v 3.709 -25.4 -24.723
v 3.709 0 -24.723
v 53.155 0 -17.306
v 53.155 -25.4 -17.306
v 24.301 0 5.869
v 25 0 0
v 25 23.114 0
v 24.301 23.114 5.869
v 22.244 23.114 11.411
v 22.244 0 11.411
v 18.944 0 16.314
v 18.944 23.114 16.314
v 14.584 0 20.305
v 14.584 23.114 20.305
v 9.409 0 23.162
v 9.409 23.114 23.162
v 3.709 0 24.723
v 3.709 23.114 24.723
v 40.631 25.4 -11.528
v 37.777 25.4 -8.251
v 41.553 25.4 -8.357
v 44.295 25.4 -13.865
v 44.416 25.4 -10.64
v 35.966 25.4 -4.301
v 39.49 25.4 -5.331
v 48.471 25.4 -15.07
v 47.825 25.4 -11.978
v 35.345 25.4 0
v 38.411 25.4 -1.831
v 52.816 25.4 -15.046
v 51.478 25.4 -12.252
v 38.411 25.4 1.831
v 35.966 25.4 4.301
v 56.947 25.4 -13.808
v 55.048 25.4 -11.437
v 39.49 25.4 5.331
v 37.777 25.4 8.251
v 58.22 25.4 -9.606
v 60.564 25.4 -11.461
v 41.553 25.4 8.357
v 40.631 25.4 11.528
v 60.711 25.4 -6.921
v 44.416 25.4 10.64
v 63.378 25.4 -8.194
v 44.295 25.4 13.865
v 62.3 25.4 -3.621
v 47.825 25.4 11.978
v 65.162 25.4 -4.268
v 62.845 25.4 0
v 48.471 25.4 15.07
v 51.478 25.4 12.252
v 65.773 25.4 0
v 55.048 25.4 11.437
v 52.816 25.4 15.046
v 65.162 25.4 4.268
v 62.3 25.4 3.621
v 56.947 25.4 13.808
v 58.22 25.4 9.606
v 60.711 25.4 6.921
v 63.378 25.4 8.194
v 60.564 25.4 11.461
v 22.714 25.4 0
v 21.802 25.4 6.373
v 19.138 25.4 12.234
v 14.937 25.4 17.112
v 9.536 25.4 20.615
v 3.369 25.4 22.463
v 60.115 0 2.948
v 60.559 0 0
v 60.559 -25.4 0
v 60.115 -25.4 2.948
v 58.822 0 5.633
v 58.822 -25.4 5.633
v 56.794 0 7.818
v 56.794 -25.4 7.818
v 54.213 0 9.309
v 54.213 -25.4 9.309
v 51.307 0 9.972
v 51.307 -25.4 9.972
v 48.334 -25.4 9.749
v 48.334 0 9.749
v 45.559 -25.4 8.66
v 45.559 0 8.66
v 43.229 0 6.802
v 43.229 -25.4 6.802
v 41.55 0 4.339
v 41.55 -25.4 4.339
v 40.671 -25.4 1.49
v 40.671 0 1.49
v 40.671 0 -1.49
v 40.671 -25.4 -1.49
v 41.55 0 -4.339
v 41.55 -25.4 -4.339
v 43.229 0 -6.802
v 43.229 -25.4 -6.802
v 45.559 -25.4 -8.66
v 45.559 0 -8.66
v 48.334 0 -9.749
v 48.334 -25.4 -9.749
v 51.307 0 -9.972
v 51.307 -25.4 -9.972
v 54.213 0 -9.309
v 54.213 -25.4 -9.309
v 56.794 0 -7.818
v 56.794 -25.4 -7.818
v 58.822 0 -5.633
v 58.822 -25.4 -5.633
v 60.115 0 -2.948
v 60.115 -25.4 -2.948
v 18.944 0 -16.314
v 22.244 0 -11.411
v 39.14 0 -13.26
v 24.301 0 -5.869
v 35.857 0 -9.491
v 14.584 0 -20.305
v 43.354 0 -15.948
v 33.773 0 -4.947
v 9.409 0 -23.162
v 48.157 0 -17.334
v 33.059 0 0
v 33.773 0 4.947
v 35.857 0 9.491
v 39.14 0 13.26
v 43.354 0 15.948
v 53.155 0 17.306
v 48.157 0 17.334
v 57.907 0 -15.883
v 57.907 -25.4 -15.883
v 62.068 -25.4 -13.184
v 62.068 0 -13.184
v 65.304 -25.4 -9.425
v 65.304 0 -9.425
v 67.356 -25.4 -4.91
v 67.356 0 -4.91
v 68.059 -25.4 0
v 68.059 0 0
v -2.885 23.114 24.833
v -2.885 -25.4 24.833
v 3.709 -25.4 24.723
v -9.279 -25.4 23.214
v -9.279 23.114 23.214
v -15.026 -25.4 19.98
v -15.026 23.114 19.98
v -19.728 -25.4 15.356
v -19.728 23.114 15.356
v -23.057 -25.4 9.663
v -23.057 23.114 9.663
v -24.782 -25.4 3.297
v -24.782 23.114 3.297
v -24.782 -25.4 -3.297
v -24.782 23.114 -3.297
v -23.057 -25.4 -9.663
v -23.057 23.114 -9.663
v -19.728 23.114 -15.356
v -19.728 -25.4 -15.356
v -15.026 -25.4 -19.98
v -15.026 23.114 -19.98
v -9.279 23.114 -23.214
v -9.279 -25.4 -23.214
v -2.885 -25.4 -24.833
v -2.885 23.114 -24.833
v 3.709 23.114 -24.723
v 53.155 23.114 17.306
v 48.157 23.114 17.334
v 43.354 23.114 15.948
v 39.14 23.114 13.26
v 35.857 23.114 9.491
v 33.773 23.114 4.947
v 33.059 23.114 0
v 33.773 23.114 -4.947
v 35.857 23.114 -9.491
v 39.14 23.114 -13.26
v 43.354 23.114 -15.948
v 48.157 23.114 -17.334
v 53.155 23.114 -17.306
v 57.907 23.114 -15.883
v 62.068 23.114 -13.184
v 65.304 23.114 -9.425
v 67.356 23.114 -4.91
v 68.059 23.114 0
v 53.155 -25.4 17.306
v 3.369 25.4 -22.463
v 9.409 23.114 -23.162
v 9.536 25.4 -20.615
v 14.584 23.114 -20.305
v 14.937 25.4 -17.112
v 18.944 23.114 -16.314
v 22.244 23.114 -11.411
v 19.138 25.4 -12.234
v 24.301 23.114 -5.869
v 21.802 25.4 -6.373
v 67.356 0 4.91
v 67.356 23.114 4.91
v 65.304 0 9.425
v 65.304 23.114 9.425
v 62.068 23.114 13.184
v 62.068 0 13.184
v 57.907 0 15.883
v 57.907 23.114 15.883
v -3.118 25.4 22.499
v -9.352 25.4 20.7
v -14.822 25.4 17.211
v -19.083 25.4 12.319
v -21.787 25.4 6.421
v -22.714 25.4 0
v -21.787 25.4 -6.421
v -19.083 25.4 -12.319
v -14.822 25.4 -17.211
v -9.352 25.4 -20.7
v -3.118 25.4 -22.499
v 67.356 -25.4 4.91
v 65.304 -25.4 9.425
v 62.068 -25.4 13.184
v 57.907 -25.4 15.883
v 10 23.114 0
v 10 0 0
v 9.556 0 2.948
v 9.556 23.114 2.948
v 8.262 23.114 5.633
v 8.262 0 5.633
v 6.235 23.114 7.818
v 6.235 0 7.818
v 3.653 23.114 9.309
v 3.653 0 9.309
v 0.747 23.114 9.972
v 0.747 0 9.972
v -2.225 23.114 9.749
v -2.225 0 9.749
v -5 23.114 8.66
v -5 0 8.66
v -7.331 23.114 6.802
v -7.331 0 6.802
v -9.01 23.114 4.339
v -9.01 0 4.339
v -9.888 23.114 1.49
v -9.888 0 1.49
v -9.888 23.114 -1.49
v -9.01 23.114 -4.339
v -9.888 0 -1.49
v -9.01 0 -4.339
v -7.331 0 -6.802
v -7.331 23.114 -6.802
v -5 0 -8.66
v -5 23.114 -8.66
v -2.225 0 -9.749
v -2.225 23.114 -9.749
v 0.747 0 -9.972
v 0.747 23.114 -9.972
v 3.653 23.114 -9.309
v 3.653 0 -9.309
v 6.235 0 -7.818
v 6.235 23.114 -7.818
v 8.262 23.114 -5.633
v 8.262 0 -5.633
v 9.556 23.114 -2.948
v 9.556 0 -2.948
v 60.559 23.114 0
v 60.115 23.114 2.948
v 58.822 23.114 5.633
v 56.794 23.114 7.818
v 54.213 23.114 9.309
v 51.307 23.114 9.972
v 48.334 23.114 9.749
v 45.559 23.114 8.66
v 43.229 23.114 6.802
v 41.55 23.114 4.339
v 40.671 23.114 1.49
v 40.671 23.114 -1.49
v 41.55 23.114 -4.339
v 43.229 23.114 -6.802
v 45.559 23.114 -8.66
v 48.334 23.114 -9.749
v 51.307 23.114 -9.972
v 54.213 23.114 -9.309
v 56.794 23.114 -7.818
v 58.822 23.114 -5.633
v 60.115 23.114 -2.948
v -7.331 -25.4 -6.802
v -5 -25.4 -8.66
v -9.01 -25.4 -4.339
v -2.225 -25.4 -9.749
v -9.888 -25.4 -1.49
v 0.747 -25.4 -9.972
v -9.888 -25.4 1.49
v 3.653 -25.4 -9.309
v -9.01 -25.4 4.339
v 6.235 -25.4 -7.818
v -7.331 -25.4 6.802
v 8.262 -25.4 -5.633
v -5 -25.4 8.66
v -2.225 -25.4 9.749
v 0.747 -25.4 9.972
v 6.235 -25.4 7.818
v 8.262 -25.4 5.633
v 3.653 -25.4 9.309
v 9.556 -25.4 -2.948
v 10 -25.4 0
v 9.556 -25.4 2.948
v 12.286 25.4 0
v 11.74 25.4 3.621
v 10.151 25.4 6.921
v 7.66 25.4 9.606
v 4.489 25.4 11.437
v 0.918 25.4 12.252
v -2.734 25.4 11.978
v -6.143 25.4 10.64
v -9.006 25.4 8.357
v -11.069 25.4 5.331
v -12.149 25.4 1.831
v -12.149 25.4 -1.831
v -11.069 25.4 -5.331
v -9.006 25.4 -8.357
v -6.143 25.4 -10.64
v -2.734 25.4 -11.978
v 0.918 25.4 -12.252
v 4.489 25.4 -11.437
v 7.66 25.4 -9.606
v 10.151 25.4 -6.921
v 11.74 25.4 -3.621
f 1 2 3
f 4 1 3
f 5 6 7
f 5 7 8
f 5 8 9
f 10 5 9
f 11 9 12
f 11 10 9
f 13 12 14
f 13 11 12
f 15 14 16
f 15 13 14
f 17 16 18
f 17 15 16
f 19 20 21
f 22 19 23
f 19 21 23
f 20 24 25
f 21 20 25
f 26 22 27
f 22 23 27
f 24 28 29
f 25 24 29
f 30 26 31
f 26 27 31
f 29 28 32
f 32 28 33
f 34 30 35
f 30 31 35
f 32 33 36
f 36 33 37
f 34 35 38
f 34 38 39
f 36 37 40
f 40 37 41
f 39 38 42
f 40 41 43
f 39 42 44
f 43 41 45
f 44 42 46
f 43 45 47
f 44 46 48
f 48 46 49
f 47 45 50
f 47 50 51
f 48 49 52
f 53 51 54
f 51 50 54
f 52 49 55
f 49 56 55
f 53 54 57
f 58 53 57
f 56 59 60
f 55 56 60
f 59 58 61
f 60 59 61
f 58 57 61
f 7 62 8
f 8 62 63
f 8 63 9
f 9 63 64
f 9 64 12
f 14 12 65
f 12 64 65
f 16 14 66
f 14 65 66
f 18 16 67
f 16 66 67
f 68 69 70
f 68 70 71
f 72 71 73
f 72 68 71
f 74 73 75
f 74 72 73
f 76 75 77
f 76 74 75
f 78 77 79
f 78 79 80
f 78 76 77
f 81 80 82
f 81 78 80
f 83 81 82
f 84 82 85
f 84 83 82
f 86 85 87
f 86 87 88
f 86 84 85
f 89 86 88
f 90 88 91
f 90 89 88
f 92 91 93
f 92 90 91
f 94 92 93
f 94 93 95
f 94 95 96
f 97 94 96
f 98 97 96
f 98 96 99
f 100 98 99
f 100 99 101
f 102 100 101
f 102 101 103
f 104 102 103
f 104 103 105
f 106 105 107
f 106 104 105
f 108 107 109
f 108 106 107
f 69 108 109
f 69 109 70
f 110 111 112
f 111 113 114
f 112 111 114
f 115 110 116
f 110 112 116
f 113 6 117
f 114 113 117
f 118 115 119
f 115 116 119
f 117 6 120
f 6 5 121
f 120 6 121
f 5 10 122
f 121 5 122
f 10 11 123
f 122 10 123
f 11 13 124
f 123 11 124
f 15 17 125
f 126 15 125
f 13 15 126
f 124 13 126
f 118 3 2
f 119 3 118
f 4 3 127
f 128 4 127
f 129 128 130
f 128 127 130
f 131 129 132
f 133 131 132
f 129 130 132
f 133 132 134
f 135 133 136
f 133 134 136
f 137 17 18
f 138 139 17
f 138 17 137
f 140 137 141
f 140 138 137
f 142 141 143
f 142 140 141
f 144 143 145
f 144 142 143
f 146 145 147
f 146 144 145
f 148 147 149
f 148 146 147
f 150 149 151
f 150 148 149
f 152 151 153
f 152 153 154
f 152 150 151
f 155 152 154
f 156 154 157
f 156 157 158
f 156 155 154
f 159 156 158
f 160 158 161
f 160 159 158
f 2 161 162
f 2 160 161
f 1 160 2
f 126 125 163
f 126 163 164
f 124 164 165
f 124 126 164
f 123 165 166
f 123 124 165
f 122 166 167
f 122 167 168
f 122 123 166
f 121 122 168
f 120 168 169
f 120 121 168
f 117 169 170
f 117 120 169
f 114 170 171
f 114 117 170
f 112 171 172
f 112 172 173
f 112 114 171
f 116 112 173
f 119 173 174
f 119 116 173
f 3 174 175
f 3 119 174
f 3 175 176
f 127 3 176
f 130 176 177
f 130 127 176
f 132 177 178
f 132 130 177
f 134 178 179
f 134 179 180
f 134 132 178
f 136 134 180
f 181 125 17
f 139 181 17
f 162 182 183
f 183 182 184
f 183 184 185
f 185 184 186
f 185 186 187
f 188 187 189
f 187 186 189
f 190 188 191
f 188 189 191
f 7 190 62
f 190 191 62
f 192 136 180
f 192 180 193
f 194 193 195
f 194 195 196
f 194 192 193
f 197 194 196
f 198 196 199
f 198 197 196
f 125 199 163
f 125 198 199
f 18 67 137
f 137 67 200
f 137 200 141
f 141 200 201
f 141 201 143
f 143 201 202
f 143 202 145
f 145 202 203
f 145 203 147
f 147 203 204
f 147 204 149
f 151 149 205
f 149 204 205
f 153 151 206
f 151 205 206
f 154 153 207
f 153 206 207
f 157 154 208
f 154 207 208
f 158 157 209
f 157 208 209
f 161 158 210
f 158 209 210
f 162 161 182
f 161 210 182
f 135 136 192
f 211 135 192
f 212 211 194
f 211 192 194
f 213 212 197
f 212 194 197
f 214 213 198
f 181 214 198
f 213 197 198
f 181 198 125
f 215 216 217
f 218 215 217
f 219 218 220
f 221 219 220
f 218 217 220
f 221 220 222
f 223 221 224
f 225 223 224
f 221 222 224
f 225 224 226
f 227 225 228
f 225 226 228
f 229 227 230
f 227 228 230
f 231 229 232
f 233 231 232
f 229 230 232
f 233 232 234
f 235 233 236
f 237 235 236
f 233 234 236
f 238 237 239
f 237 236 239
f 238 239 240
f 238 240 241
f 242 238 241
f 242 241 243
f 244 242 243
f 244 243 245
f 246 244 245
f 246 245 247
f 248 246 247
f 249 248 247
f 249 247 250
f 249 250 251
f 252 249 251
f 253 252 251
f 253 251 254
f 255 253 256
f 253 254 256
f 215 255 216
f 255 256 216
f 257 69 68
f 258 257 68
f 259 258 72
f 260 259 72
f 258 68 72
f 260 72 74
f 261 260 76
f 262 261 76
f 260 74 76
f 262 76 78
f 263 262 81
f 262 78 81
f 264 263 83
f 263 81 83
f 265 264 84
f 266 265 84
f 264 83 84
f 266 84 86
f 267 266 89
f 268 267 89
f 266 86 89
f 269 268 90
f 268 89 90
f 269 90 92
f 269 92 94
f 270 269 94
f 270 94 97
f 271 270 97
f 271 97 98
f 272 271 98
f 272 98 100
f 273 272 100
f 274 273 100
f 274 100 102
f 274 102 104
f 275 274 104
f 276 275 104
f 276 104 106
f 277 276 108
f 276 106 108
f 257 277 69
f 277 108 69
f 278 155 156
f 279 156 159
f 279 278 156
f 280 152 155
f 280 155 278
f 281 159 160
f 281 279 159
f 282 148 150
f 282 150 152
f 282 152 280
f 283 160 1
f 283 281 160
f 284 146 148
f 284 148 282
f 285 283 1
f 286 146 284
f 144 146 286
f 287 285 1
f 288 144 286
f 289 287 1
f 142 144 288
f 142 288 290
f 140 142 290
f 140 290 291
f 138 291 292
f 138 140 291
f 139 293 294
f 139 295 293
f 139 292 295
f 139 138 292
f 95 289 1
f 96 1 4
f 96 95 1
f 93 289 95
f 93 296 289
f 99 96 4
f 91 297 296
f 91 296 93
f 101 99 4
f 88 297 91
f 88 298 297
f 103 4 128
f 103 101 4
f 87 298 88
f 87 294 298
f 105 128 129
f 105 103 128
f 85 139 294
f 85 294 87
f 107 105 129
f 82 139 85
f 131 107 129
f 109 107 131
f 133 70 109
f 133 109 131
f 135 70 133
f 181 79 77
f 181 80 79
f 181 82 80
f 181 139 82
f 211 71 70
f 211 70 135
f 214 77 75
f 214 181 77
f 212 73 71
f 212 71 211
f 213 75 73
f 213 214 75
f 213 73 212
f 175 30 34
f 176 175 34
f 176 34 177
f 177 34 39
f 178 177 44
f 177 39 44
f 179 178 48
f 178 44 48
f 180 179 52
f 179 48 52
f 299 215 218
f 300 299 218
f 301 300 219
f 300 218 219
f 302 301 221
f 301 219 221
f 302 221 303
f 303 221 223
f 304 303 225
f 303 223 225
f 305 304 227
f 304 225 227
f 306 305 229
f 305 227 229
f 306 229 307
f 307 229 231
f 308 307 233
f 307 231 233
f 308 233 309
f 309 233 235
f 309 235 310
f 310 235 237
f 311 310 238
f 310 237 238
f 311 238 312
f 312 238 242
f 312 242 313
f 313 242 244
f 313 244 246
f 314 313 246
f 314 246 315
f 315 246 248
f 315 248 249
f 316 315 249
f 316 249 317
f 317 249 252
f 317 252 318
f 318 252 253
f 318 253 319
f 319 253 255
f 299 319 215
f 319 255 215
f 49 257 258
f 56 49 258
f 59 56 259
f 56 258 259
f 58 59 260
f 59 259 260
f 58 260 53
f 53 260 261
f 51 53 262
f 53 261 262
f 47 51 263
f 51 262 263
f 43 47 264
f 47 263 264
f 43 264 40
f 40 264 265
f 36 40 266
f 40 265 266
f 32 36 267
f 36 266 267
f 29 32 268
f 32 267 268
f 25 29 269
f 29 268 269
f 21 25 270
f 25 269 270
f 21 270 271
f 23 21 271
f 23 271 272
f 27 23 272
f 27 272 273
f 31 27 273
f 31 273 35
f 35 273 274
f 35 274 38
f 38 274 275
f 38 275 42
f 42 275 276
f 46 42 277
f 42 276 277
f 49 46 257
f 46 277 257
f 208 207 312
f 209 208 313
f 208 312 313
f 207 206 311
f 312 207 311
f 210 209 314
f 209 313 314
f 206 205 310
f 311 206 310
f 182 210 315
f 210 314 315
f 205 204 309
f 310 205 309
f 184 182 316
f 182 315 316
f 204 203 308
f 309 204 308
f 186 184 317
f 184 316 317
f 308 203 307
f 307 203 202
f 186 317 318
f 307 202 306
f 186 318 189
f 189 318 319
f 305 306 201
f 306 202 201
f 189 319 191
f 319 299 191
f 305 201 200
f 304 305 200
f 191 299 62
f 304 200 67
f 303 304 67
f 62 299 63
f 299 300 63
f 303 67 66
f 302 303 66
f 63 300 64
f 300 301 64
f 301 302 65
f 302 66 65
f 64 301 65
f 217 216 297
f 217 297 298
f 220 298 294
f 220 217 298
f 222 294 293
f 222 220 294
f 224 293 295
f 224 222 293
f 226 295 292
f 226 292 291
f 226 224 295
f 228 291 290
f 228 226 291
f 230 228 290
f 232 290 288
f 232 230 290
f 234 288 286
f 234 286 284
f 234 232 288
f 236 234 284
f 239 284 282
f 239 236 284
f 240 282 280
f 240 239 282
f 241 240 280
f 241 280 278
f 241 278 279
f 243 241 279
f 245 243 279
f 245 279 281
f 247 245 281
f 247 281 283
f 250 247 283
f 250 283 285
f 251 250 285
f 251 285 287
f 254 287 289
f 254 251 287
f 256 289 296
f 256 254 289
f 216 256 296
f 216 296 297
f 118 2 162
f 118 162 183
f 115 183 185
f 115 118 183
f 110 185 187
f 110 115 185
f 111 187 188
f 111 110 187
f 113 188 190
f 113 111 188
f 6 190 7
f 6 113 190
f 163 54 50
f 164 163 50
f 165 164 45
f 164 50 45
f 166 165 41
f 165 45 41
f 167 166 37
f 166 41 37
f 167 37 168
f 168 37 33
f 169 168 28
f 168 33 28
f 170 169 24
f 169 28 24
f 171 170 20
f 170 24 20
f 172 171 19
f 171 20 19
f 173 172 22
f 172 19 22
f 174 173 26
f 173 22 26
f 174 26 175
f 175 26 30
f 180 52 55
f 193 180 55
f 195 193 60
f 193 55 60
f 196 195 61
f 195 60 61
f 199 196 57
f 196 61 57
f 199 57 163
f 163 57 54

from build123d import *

# Parameters (mm, degrees)
F0_R     = 10
F1_DEPTH = 25.4
F3_DEPTH = 25.4
F4_DEPTH = 25.4
F5_SIZE  = 2.286


# Not quite as in the source:
# - the program builds the solid bodies; features that only make, move or delete a surface that nothing else refers to are left out


with BuildPart() as f1:
    # F0 (on Front) → F1 (new body)
    with BuildSketch(Plane.XZ):
        with BuildLine():
            ThreePointArc((3.7085113233, -24.7234088217), (18.9435052601, -16.313908436), (25, 0))
            ThreePointArc((25, 0), (18.9435052601, 16.313908436), (3.7085113233, 24.7234088217))
            ThreePointArc((3.7085113233, 24.7234088217), (-25, 0), (3.7085113233, -24.7234088217))
        make_face()
        Circle(F0_R, mode=Mode.SUBTRACT)
        with BuildLine():
            ThreePointArc((3.7085113233, 24.7234088217), (18.9435052601, 16.313908436), (25, 0))
            ThreePointArc((25, 0), (18.9435052601, -16.313908436), (3.7085113233, -24.7234088217))
            Line((3.7085113233, -24.7234088217), (53.1553289667, -17.3063861752))
            ThreePointArc((53.1553289667, -17.3063861752), (33.0593710404, 0), (53.1553289667, 17.3063861752))
            Line((53.1553289667, 17.3063861752), (3.7085113233, 24.7234088217))
        make_face()
        with BuildLine():
            ThreePointArc((68.0593710404, 0), (63.8198247225, 11.4197359052), (53.1553289667, 17.3063861752))
            ThreePointArc((53.1553289667, 17.3063861752), (33.0593710404, 0), (53.1553289667, -17.3063861752))
            ThreePointArc((53.1553289667, -17.3063861752), (63.8198247225, -11.4197359052), (68.0593710404, 0))
        make_face()
        with Locations((50.5593710404, 0)):
            Circle(F0_R, mode=Mode.SUBTRACT)
    extrude(amount=F1_DEPTH)

    # F0 (on Front) → F3 (join)
    with BuildSketch(Plane.XZ):
        with BuildLine():
            ThreePointArc((3.7085113233, -24.7234088217), (18.9435052601, -16.313908436), (25, 0))
            ThreePointArc((25, 0), (18.9435052601, 16.313908436), (3.7085113233, 24.7234088217))
            ThreePointArc((3.7085113233, 24.7234088217), (-25, 0), (3.7085113233, -24.7234088217))
        make_face()
        Circle(F0_R, mode=Mode.SUBTRACT)
        with BuildLine():
            ThreePointArc((68.0593710404, 0), (63.8198247225, 11.4197359052), (53.1553289667, 17.3063861752))
            ThreePointArc((53.1553289667, 17.3063861752), (33.0593710404, 0), (53.1553289667, -17.3063861752))
            ThreePointArc((53.1553289667, -17.3063861752), (63.8198247225, -11.4197359052), (68.0593710404, 0))
        make_face()
        with Locations((50.5593710404, 0)):
            Circle(F0_R, mode=Mode.SUBTRACT)
    extrude(amount=F3_DEPTH)

    # F0 (on Front) → F4 (join)
    with BuildSketch(Plane.XZ):
        with BuildLine():
            ThreePointArc((3.7085113233, -24.7234088217), (18.9435052601, -16.313908436), (25, 0))
            ThreePointArc((25, 0), (18.9435052601, 16.313908436), (3.7085113233, 24.7234088217))
            ThreePointArc((3.7085113233, 24.7234088217), (-25, 0), (3.7085113233, -24.7234088217))
        make_face()
        Circle(F0_R, mode=Mode.SUBTRACT)
        with BuildLine():
            ThreePointArc((68.0593710404, 0), (63.8198247225, 11.4197359052), (53.1553289667, 17.3063861752))
            ThreePointArc((53.1553289667, 17.3063861752), (33.0593710404, 0), (53.1553289667, -17.3063861752))
            ThreePointArc((53.1553289667, -17.3063861752), (63.8198247225, -11.4197359052), (68.0593710404, 0))
        make_face()
        with Locations((50.5593710404, 0)):
            Circle(F0_R, mode=Mode.SUBTRACT)
    extrude(amount=-F4_DEPTH)

    # F5
    f5_edges = [f1.edges().sort_by_distance(p)[0] for p in [
        (-10, 25.4, 0),
        (-25, 25.4, 0),
        (33.059371, 25.4, 0),
        (40.559371, 25.4, 0),
    ]]
    chamfer(f5_edges, length=F5_SIZE)


solid = f1.part
